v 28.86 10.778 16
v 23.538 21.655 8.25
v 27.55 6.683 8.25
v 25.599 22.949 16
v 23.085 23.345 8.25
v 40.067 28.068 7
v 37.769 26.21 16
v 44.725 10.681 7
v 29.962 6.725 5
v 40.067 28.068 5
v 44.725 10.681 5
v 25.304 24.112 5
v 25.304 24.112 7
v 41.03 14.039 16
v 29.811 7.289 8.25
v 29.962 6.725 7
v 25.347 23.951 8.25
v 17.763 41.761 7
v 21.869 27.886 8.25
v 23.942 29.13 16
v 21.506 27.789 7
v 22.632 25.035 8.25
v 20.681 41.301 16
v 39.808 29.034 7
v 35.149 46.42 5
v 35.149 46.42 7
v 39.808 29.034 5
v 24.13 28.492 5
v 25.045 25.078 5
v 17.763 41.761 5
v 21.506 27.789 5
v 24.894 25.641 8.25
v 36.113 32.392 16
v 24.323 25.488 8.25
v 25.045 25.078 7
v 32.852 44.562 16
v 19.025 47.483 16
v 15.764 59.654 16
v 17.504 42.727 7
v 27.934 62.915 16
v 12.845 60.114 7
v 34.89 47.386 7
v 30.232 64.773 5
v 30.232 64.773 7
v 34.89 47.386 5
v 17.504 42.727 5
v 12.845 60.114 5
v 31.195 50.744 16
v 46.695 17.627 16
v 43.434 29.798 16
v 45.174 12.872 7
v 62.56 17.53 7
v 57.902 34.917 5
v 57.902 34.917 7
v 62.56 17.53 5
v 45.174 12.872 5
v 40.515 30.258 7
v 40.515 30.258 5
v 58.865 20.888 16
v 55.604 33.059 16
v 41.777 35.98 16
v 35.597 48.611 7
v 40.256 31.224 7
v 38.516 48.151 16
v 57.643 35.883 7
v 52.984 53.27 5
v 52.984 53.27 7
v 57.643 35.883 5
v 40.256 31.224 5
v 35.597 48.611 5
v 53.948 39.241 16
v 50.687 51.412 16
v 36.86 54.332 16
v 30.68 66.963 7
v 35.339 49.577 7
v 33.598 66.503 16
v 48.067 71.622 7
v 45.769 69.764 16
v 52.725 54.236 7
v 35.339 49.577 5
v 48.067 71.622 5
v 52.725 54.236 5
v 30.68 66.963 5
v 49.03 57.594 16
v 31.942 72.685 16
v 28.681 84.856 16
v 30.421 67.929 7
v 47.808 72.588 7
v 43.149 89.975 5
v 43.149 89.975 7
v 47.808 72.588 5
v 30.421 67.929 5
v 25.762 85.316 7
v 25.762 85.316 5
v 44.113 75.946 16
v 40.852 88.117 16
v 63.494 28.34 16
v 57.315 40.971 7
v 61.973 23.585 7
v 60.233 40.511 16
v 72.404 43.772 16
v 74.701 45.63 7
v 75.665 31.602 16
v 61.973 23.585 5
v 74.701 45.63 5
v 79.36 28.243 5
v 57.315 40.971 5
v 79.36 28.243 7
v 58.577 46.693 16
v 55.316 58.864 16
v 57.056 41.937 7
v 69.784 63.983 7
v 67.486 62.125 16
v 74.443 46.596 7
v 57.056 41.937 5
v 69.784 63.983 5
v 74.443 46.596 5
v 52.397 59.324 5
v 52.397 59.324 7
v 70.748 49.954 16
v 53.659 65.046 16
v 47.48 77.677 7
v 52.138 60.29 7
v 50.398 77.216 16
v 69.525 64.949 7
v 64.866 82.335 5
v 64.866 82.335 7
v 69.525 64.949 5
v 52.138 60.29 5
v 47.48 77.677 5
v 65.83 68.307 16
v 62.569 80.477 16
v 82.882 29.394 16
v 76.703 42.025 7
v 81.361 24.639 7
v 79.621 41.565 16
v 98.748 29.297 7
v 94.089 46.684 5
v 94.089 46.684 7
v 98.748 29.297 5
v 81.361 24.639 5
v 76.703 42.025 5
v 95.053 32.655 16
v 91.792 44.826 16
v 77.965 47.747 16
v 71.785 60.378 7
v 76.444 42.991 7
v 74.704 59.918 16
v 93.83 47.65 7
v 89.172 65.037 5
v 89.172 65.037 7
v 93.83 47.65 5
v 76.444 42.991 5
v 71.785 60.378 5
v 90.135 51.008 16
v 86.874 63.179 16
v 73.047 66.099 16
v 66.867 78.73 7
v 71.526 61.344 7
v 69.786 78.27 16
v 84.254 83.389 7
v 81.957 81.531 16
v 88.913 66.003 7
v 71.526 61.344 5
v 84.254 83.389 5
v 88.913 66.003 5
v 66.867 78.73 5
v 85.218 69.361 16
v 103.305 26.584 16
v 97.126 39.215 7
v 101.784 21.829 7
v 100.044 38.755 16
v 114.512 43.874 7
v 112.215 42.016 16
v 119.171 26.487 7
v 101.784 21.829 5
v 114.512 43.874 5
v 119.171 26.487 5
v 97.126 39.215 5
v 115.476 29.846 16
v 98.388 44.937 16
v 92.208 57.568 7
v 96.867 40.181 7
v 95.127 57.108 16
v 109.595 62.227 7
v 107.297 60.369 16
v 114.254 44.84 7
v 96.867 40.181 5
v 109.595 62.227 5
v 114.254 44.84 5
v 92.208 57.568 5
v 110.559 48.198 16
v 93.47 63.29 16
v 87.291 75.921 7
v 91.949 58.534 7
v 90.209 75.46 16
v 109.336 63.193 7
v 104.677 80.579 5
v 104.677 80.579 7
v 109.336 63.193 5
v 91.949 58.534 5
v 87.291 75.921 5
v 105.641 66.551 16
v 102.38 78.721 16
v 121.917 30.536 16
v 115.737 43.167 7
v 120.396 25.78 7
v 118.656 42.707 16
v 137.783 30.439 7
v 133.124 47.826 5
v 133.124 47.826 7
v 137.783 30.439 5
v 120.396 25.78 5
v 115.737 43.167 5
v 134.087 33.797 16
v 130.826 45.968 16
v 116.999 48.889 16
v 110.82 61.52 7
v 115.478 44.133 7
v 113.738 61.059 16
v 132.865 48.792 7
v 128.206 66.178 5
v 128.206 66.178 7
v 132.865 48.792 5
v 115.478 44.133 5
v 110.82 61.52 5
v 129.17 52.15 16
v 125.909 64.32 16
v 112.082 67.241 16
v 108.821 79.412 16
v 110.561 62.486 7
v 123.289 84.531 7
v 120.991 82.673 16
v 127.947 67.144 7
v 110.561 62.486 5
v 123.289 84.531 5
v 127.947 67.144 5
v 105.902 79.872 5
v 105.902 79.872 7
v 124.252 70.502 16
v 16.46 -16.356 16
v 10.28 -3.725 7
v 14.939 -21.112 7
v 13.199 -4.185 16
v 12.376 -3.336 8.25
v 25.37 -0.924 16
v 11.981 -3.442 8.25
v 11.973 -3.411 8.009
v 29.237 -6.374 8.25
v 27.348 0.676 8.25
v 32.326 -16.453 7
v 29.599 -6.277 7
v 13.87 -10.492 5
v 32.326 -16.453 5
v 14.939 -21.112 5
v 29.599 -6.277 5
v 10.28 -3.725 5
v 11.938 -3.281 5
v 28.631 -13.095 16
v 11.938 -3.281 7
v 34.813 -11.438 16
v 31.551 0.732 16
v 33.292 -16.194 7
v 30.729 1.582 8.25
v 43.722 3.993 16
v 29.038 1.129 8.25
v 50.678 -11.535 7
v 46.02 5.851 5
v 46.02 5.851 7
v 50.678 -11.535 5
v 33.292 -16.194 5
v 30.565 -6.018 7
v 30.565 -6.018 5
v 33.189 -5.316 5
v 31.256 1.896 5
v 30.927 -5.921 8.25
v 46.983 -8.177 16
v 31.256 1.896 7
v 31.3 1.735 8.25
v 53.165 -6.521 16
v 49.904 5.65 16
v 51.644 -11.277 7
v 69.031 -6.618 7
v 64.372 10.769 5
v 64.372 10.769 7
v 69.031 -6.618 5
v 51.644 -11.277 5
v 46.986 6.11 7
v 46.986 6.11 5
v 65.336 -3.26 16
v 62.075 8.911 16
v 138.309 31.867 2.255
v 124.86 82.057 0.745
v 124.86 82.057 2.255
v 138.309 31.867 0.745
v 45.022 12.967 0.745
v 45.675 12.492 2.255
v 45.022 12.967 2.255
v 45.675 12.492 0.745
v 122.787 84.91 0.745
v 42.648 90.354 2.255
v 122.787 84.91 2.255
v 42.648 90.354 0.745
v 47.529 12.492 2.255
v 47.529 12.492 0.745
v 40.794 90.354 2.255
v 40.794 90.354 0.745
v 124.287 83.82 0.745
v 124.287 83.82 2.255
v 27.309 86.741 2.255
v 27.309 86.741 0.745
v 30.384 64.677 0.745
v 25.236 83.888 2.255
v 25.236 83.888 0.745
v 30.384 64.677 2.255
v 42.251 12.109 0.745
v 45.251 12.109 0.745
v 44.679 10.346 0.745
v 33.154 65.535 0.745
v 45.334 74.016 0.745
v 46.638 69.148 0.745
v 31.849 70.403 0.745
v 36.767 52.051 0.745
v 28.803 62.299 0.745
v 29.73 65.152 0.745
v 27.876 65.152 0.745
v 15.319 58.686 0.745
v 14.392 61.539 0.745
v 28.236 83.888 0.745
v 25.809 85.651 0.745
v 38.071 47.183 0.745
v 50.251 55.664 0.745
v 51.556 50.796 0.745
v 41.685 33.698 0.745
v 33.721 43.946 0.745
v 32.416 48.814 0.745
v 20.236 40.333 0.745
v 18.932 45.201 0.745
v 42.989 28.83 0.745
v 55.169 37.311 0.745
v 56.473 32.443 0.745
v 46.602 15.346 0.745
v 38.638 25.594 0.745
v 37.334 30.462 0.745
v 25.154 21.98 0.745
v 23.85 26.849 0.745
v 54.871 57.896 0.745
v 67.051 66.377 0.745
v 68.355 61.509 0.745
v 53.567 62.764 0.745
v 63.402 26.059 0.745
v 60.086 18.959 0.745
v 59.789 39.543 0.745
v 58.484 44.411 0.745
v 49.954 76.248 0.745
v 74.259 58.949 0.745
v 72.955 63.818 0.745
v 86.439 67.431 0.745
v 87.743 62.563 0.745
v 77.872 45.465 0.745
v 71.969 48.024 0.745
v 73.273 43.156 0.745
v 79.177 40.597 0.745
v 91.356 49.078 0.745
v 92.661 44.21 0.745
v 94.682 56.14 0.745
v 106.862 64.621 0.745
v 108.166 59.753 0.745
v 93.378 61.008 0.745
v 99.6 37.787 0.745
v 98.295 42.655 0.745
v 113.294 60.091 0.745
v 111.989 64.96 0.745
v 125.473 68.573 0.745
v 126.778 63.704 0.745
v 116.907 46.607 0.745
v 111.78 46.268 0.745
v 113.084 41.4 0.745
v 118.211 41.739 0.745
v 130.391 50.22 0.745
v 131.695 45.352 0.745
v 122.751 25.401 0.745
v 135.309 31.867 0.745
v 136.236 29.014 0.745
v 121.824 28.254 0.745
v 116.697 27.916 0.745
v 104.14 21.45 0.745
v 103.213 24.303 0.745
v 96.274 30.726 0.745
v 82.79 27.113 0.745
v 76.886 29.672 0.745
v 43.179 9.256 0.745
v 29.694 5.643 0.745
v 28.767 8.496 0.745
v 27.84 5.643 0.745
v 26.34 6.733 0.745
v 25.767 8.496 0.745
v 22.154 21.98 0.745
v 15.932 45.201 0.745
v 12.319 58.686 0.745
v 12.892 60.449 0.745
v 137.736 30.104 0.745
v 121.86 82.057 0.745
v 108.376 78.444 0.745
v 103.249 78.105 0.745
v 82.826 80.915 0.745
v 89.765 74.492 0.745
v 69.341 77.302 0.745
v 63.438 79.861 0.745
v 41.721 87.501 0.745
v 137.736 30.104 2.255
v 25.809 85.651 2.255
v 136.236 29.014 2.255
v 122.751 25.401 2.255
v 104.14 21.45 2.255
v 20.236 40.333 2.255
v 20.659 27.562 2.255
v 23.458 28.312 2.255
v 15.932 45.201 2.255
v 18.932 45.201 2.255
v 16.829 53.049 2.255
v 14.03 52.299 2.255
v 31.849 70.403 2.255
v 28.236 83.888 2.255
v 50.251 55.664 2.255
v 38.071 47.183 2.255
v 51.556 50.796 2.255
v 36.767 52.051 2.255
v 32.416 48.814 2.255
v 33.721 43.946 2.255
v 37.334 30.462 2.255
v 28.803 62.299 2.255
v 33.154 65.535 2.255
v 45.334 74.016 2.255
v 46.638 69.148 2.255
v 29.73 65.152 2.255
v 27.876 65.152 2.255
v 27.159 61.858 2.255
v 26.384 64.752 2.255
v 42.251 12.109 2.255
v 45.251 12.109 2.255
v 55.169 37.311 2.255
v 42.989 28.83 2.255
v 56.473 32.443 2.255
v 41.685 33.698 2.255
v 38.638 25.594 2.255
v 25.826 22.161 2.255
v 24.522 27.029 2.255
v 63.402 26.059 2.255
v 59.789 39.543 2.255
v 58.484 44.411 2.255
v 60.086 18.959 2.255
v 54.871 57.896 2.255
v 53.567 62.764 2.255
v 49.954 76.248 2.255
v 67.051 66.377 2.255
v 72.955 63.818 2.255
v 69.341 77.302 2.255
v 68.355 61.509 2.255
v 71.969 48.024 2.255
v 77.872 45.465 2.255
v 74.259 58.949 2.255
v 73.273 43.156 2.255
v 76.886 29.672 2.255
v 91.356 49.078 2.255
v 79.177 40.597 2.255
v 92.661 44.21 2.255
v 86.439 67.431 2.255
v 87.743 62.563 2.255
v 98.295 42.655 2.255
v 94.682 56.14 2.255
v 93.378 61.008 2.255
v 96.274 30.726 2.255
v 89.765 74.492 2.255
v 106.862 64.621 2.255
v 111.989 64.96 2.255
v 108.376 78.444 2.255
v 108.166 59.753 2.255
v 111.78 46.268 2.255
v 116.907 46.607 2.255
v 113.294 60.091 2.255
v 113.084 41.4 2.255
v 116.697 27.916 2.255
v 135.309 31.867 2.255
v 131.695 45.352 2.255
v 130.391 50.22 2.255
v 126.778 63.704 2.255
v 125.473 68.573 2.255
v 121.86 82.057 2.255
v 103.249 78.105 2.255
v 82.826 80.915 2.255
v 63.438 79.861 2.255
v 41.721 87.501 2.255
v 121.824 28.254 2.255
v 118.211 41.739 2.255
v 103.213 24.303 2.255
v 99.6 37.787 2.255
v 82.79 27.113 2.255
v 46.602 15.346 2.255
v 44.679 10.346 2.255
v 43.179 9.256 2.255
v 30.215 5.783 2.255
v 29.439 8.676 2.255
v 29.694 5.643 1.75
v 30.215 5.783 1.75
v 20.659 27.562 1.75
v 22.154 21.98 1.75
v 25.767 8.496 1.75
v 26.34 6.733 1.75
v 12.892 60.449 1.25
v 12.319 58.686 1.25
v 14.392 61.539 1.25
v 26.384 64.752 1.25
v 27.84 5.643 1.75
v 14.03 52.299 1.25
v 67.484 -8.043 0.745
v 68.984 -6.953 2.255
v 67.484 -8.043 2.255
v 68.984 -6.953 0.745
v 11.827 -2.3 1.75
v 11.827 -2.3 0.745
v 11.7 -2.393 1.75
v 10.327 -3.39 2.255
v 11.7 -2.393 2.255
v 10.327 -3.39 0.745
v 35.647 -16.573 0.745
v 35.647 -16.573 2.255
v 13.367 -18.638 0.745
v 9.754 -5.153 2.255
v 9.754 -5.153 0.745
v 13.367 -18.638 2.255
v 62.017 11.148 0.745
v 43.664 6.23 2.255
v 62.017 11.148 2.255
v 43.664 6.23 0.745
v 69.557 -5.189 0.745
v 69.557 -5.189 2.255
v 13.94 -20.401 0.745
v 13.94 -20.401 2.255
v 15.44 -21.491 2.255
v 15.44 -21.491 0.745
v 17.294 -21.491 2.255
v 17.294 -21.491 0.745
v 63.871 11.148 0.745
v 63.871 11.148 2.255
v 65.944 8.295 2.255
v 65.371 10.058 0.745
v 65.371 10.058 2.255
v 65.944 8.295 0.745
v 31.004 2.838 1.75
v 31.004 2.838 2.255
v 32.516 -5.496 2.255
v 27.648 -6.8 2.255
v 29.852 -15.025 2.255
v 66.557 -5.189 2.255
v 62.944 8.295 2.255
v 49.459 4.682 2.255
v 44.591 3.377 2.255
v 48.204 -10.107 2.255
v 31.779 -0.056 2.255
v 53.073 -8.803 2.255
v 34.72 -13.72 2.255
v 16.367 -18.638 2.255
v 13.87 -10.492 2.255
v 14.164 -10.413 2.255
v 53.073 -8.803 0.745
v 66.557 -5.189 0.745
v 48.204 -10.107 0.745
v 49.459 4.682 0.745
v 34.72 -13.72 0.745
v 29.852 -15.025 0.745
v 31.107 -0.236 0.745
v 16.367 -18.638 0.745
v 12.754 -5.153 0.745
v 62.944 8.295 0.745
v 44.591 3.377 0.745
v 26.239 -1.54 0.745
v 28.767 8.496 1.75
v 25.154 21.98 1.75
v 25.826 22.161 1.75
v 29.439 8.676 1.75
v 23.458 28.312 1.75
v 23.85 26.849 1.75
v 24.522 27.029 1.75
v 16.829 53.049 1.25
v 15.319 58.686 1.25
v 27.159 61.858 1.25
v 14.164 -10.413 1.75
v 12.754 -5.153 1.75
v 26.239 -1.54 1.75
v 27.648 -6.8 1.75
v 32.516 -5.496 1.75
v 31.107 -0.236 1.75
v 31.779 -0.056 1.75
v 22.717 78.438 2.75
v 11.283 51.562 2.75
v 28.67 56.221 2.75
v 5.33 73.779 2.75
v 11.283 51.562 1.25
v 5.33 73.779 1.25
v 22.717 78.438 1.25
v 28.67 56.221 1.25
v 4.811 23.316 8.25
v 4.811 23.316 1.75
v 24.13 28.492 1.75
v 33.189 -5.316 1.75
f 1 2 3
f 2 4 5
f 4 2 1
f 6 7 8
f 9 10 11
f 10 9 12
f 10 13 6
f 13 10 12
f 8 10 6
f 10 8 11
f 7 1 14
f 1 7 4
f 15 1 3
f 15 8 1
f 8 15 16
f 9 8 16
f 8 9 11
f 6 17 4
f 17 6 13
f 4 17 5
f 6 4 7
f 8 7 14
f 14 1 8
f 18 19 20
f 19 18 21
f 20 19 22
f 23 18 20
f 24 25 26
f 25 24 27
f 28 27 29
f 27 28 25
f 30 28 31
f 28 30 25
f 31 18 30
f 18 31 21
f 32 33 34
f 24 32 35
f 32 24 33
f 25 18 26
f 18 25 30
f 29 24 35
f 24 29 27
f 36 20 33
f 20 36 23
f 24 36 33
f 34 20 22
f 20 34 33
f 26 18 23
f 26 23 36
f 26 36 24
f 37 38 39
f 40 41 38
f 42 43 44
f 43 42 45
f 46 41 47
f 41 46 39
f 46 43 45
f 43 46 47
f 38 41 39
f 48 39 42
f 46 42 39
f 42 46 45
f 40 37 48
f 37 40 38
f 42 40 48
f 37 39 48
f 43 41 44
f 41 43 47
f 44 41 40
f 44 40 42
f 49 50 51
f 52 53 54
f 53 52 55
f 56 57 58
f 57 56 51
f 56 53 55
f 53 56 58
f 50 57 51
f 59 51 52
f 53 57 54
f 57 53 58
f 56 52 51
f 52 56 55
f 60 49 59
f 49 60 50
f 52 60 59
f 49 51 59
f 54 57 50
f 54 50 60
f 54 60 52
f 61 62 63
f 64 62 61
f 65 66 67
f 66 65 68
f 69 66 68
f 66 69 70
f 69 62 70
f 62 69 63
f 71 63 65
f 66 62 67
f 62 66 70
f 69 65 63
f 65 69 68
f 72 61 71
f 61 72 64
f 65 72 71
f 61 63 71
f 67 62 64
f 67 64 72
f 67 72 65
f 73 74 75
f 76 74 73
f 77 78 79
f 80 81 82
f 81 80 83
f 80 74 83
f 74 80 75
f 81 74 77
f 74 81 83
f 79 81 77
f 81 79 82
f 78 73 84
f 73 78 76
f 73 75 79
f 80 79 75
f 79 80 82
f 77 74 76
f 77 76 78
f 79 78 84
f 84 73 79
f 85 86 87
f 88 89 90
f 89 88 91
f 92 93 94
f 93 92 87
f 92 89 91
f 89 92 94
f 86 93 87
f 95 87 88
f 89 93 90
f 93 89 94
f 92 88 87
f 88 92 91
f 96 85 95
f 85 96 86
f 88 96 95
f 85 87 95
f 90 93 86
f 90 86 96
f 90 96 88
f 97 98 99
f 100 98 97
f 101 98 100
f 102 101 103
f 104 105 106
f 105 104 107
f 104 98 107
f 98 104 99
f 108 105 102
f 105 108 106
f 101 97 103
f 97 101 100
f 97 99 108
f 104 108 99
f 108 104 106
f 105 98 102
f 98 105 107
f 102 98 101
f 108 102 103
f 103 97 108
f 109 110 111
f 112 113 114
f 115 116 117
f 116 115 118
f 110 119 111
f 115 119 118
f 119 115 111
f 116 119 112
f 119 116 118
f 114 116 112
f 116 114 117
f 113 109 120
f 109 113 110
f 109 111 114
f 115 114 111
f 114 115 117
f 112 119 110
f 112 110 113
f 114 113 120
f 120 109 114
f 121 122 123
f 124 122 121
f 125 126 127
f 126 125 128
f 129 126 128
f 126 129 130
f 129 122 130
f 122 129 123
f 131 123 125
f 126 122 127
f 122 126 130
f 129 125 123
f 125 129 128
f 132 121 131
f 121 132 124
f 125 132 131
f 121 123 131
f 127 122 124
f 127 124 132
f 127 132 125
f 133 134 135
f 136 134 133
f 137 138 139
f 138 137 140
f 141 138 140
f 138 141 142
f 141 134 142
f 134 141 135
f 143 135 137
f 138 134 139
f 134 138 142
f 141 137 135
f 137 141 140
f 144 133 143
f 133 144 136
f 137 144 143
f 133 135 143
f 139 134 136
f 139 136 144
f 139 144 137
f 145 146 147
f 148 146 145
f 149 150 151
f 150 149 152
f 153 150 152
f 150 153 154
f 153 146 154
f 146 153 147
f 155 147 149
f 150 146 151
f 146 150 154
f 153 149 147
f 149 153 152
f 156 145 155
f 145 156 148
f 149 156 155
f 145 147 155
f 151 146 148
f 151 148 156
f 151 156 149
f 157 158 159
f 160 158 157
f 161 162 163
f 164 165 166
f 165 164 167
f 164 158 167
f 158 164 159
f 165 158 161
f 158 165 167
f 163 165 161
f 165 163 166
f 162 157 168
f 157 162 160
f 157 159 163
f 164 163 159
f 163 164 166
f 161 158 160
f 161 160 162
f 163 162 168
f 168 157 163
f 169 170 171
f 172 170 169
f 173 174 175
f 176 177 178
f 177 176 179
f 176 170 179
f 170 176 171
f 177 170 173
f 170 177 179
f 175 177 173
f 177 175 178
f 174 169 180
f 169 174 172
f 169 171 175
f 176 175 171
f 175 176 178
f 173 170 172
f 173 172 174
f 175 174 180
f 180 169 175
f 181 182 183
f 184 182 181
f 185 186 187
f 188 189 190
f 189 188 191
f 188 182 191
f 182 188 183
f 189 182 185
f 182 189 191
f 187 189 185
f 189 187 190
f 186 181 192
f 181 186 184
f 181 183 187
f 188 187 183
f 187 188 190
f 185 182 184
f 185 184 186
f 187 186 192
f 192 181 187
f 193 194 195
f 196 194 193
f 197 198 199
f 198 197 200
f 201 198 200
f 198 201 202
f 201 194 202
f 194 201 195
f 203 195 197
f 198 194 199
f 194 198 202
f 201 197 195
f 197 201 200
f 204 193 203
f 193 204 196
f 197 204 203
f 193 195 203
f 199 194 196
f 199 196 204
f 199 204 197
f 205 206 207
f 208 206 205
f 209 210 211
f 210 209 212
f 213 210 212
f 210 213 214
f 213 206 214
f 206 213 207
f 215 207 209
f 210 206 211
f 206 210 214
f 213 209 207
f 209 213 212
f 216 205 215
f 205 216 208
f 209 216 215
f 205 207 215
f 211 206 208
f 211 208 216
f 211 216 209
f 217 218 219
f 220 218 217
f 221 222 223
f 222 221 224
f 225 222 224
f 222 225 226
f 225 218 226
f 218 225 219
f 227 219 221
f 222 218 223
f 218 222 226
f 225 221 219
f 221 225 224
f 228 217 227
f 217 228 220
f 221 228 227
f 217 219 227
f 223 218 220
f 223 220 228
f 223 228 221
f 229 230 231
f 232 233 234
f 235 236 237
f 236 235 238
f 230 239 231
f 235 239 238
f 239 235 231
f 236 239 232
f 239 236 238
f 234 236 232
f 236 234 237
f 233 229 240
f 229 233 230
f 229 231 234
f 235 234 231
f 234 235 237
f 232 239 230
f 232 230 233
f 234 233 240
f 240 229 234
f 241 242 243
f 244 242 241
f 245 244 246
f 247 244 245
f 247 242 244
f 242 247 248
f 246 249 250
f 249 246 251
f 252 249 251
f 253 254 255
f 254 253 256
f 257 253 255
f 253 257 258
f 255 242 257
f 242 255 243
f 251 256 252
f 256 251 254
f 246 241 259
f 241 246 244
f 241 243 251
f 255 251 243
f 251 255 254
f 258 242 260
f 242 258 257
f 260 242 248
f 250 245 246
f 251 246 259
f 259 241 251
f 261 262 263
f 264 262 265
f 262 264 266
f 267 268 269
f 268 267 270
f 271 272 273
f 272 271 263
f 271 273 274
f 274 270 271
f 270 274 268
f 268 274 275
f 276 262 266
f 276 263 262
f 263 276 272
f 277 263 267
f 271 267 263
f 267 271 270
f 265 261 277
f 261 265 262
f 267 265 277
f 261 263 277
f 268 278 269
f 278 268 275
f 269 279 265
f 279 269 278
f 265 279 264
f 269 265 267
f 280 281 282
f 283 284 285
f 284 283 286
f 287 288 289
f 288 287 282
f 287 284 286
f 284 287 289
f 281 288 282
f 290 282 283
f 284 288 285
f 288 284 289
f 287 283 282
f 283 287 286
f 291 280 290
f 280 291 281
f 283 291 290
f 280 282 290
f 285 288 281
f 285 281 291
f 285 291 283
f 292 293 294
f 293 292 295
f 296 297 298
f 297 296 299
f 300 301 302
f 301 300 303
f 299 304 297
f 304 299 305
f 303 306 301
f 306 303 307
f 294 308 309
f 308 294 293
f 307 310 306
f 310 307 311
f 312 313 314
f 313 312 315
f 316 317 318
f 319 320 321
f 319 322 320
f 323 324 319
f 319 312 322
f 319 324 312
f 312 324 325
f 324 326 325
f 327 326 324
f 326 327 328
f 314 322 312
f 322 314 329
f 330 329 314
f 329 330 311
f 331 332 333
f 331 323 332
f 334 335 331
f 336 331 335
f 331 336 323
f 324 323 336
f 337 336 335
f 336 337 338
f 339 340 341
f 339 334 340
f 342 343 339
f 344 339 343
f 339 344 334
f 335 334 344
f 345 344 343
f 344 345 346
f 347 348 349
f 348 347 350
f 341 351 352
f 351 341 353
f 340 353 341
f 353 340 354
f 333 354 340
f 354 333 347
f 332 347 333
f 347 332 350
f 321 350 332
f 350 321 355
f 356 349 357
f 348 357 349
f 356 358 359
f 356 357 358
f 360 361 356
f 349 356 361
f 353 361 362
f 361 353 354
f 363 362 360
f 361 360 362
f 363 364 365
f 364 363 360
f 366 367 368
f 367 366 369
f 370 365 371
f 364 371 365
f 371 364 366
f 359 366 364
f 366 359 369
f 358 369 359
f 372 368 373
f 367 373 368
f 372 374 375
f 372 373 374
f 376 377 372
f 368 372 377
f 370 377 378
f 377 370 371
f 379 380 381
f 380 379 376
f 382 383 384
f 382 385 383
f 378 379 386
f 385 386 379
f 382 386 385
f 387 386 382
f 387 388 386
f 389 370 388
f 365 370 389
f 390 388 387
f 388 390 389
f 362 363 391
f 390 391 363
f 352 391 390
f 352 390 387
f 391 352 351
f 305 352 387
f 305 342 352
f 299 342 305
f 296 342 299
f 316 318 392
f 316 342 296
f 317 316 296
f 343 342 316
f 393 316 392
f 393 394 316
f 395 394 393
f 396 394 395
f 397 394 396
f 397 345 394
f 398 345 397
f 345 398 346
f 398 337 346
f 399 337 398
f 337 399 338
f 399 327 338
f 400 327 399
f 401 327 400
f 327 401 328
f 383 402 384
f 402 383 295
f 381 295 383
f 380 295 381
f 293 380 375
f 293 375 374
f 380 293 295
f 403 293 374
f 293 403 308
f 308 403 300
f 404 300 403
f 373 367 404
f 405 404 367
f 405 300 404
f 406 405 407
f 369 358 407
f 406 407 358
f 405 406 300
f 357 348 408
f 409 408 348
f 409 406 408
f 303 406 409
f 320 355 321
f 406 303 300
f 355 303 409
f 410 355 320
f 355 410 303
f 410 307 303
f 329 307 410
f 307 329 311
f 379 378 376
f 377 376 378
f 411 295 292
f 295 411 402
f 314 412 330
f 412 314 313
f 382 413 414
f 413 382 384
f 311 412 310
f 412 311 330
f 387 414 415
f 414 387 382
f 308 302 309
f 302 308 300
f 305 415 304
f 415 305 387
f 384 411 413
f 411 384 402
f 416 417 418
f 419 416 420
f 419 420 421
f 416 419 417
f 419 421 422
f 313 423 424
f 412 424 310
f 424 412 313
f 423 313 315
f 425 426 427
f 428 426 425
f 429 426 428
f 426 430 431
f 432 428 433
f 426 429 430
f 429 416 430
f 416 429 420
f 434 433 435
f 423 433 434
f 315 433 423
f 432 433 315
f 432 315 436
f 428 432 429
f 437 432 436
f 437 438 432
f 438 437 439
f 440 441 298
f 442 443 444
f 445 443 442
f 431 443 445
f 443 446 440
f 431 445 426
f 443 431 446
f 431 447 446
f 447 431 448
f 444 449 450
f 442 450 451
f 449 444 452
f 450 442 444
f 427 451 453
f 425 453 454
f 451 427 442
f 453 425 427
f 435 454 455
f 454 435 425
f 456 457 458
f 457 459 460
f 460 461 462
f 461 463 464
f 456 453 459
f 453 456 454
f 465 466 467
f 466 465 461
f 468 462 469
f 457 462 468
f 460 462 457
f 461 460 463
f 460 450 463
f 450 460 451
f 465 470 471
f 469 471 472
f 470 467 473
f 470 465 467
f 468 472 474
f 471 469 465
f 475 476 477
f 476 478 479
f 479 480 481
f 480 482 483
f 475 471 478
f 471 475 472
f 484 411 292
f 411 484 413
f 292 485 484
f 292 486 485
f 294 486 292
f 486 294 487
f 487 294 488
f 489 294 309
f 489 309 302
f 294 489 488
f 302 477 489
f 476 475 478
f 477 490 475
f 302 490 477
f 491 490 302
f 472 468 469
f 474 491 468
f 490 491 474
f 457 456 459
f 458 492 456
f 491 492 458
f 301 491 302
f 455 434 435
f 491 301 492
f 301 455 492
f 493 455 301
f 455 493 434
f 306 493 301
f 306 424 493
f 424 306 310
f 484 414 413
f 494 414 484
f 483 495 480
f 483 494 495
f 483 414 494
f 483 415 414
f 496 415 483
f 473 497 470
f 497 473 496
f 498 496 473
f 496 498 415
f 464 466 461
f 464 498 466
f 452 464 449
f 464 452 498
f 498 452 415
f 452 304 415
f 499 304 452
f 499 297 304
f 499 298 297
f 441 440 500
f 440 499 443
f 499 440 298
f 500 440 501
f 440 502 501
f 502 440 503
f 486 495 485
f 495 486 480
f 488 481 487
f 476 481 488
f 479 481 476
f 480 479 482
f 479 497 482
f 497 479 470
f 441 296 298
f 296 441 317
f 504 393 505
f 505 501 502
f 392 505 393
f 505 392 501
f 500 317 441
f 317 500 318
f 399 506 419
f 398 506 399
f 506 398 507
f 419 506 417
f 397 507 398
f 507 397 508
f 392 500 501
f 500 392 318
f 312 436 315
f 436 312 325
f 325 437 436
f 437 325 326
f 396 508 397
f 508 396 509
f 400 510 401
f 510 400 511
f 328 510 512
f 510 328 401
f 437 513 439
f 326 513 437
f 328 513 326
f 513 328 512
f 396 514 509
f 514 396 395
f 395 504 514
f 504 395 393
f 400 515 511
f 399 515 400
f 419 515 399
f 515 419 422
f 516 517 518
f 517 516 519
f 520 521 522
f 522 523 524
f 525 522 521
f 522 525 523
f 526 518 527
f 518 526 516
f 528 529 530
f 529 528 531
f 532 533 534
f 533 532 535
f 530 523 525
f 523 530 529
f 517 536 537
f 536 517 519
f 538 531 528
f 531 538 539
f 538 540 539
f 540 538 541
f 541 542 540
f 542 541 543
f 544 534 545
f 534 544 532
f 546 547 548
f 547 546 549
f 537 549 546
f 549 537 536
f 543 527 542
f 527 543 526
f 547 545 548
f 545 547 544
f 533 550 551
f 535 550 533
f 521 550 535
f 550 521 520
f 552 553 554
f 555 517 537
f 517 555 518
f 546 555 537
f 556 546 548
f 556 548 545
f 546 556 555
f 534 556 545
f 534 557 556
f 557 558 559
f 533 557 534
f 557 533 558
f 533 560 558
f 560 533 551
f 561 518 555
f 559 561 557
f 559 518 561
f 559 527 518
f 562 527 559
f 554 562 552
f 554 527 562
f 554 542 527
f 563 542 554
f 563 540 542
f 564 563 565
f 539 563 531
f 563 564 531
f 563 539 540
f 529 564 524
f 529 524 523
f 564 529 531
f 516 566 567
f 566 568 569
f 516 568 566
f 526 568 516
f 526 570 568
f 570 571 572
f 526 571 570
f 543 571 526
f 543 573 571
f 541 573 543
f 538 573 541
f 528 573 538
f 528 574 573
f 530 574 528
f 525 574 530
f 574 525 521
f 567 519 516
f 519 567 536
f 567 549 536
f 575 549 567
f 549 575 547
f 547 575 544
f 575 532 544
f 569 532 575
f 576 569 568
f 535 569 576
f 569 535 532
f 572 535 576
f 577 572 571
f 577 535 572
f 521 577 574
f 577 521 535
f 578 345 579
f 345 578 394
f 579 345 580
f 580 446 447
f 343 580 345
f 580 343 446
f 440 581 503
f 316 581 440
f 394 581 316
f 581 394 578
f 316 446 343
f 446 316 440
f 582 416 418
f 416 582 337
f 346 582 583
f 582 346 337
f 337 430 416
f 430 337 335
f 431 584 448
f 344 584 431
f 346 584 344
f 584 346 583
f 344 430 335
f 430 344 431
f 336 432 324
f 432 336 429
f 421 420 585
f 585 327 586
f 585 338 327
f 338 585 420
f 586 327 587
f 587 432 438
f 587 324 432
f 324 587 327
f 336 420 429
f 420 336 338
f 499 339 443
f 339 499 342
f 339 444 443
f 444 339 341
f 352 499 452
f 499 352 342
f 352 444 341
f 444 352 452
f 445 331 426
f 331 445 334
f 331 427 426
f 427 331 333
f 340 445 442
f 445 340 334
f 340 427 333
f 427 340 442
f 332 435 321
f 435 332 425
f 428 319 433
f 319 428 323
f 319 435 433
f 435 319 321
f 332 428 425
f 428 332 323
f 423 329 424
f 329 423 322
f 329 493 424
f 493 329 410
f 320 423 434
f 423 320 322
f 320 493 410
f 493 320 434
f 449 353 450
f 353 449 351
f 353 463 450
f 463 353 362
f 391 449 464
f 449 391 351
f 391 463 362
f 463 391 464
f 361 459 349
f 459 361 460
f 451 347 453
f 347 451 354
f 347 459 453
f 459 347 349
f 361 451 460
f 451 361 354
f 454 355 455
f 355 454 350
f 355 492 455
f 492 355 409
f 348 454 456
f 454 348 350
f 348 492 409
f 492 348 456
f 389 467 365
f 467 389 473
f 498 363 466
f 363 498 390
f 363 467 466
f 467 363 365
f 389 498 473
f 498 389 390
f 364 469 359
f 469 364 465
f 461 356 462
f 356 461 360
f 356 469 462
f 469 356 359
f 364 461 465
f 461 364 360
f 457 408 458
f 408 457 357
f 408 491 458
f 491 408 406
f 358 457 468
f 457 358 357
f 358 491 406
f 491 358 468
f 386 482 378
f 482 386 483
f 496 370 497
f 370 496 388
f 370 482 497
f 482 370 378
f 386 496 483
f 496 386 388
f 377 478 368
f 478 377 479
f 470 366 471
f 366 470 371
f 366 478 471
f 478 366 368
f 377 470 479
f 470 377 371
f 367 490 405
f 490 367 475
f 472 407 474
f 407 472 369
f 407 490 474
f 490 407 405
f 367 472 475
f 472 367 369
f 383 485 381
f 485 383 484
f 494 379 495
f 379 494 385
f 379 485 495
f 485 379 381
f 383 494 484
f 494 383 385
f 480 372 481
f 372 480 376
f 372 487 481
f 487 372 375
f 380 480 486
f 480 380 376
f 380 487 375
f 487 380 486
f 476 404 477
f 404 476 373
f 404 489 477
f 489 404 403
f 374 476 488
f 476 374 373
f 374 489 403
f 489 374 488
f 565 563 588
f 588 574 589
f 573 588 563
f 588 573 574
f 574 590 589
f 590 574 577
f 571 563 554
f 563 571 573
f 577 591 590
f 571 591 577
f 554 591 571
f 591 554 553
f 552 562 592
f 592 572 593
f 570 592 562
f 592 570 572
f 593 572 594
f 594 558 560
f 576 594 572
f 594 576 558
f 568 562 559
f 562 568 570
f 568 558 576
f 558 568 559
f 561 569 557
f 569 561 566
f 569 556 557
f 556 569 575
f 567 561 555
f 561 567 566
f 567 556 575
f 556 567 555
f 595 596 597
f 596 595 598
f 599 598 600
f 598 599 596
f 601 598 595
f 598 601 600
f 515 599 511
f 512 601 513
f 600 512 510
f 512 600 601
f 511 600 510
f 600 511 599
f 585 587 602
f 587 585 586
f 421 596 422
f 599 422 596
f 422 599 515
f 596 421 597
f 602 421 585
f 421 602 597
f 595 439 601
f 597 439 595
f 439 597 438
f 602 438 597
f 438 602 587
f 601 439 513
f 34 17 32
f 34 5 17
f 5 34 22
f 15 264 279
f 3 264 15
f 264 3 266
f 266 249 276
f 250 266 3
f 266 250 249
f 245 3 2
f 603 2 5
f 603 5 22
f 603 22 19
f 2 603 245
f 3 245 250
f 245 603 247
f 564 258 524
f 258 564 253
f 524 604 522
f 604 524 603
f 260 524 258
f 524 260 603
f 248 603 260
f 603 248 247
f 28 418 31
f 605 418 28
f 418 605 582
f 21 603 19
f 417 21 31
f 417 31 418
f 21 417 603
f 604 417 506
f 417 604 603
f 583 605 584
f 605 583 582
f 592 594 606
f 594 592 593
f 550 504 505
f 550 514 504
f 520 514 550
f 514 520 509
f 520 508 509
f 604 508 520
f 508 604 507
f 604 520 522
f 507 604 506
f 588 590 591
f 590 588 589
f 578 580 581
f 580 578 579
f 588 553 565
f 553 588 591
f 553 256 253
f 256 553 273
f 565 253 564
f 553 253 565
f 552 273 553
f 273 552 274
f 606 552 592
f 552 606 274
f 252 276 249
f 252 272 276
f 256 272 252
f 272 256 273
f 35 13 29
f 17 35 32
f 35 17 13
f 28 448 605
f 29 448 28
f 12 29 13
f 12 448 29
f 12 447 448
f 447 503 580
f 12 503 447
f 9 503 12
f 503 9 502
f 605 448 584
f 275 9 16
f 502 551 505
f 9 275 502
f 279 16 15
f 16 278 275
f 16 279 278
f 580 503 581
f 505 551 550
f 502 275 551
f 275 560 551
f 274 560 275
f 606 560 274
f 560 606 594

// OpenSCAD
union () {
  translate ([1, 0, 0]) {
    union () {
      translate ([0, 0, 2]) {
        color ([0.3, 0.3, 0.8, 1]) {
          translate ([16, 65, 0]) {
            rotate (a=14.999999999999998, v=[0, 0, 1]) {
              cube ([18, 23, 1.5], center=true);
            }
          }
        }
      }
      translate ([0, 0, 2]) {
        color ([0.3, 0.8, 0.3, 1]) {
          translate ([18, 9, 3]) {
            rotate (a=14.999999999999998, v=[0, 0, 1]) {
              cube ([20, 35, 6.5], center=true);
            }
          }
        }
      }
      translate ([0, 0, 1]) {
        rotate (a=14.999999999999998, v=[0, 0, 1]) {
          translate ([36.0, 8.0, 0]) {
            color ([0.3, 0.3, 0.3, 1]) {
              translate ([0, 0, 5]) {
                hull () {
                  cube ([18, 18, 2], center=true);
                  translate ([0, 1.5, 9]) {
                    cube ([12.6, 12.6, 2], center=true);
                  }
                }
              }
            }
          }
        }
        rotate (a=14.999999999999998, v=[0, 0, 1]) {
          translate ([36.0, 27.0, 0]) {
            color ([0.3, 0.3, 0.3, 1]) {
              translate ([0, 0, 5]) {
                hull () {
                  cube ([18, 18, 2], center=true);
                  translate ([0, 1.5, 9]) {
                    cube ([12.6, 12.6, 2], center=true);
                  }
                }
              }
            }
          }
        }
        rotate (a=14.999999999999998, v=[0, 0, 1]) {
          translate ([36.0, 46.0, 0]) {
            color ([0.3, 0.3, 0.3, 1]) {
              translate ([0, 0, 5]) {
                hull () {
                  cube ([18, 18, 2], center=true);
                  translate ([0, 1.5, 9]) {
                    cube ([12.6, 12.6, 2], center=true);
                  }
                }
              }
            }
          }
        }
        rotate (a=14.999999999999998, v=[0, 0, 1]) {
          translate ([55.0, 10.0, 0]) {
            color ([0.3, 0.3, 0.3, 1]) {
              translate ([0, 0, 5]) {
                hull () {
                  cube ([18, 18, 2], center=true);
                  translate ([0, 1.5, 9]) {
                    cube ([12.6, 12.6, 2], center=true);
                  }
                }
              }
            }
          }
        }
        rotate (a=14.999999999999998, v=[0, 0, 1]) {
          translate ([55.0, 29.0, 0]) {
            color ([0.3, 0.3, 0.3, 1]) {
              translate ([0, 0, 5]) {
                hull () {
                  cube ([18, 18, 2], center=true);
                  translate ([0, 1.5, 9]) {
                    cube ([12.6, 12.6, 2], center=true);
                  }
                }
              }
            }
          }
        }
        rotate (a=14.999999999999998, v=[0, 0, 1]) {
          translate ([55.0, 48.0, 0]) {
            color ([0.3, 0.3, 0.3, 1]) {
              translate ([0, 0, 5]) {
                hull () {
                  cube ([18, 18, 2], center=true);
                  translate ([0, 1.5, 9]) {
                    cube ([12.6, 12.6, 2], center=true);
                  }
                }
              }
            }
          }
        }
        rotate (a=14.999999999999998, v=[0, 0, 1]) {
          translate ([55.0, 67.0, 0]) {
            color ([0.3, 0.3, 0.3, 1]) {
              translate ([0, 0, 5]) {
                hull () {
                  cube ([18, 18, 2], center=true);
                  translate ([0, 1.5, 9]) {
                    cube ([12.6, 12.6, 2], center=true);
                  }
                }
              }
            }
          }
        }
        rotate (a=14.999999999999998, v=[0, 0, 1]) {
          translate ([74.0, 16.0, 0]) {
            color ([0.3, 0.3, 0.3, 1]) {
              translate ([0, 0, 5]) {
                hull () {
                  cube ([18, 18, 2], center=true);
                  translate ([0, 1.5, 9]) {
                    cube ([12.6, 12.6, 2], center=true);
                  }
                }
              }
            }
          }
        }
        rotate (a=14.999999999999998, v=[0, 0, 1]) {
          translate ([74.0, 35.0, 0]) {
            color ([0.3, 0.3, 0.3, 1]) {
              translate ([0, 0, 5]) {
                hull () {
                  cube ([18, 18, 2], center=true);
                  translate ([0, 1.5, 9]) {
                    cube ([12.6, 12.6, 2], center=true);
                  }
                }
              }
            }
          }
        }
        rotate (a=14.999999999999998, v=[0, 0, 1]) {
          translate ([74.0, 54.0, 0]) {
            color ([0.3, 0.3, 0.3, 1]) {
              translate ([0, 0, 5]) {
                hull () {
                  cube ([18, 18, 2], center=true);
                  translate ([0, 1.5, 9]) {
                    cube ([12.6, 12.6, 2], center=true);
                  }
                }
              }
            }
          }
        }
        rotate (a=14.999999999999998, v=[0, 0, 1]) {
          translate ([93.0, 12.0, 0]) {
            color ([0.3, 0.3, 0.3, 1]) {
              translate ([0, 0, 5]) {
                hull () {
                  cube ([18, 18, 2], center=true);
                  translate ([0, 1.5, 9]) {
                    cube ([12.6, 12.6, 2], center=true);
                  }
                }
              }
            }
          }
        }
        rotate (a=14.999999999999998, v=[0, 0, 1]) {
          translate ([93.0, 31.0, 0]) {
            color ([0.3, 0.3, 0.3, 1]) {
              translate ([0, 0, 5]) {
                hull () {
                  cube ([18, 18, 2], center=true);
                  translate ([0, 1.5, 9]) {
                    cube ([12.6, 12.6, 2], center=true);
                  }
                }
              }
            }
          }
        }
        rotate (a=14.999999999999998, v=[0, 0, 1]) {
          translate ([93.0, 50.0, 0]) {
            color ([0.3, 0.3, 0.3, 1]) {
              translate ([0, 0, 5]) {
                hull () {
                  cube ([18, 18, 2], center=true);
                  translate ([0, 1.5, 9]) {
                    cube ([12.6, 12.6, 2], center=true);
                  }
                }
              }
            }
          }
        }
        rotate (a=14.999999999999998, v=[0, 0, 1]) {
          translate ([112.0, 4.0, 0]) {
            color ([0.3, 0.3, 0.3, 1]) {
              translate ([0, 0, 5]) {
                hull () {
                  cube ([18, 18, 2], center=true);
                  translate ([0, 1.5, 9]) {
                    cube ([12.6, 12.6, 2], center=true);
                  }
                }
              }
            }
          }
        }
        rotate (a=14.999999999999998, v=[0, 0, 1]) {
          translate ([112.0, 23.0, 0]) {
            color ([0.3, 0.3, 0.3, 1]) {
              translate ([0, 0, 5]) {
                hull () {
                  cube ([18, 18, 2], center=true);
                  translate ([0, 1.5, 9]) {
                    cube ([12.6, 12.6, 2], center=true);
                  }
                }
              }
            }
          }
        }
        rotate (a=14.999999999999998, v=[0, 0, 1]) {
          translate ([112.0, 42.0, 0]) {
            color ([0.3, 0.3, 0.3, 1]) {
              translate ([0, 0, 5]) {
                hull () {
                  cube ([18, 18, 2], center=true);
                  translate ([0, 1.5, 9]) {
                    cube ([12.6, 12.6, 2], center=true);
                  }
                }
              }
            }
          }
        }
        rotate (a=14.999999999999998, v=[0, 0, 1]) {
          translate ([131.0, 3.0, 0]) {
            color ([0.3, 0.3, 0.3, 1]) {
              translate ([0, 0, 5]) {
                hull () {
                  cube ([18, 18, 2], center=true);
                  translate ([0, 1.5, 9]) {
                    cube ([12.6, 12.6, 2], center=true);
                  }
                }
              }
            }
          }
        }
        rotate (a=14.999999999999998, v=[0, 0, 1]) {
          translate ([131.0, 22.0, 0]) {
            color ([0.3, 0.3, 0.3, 1]) {
              translate ([0, 0, 5]) {
                hull () {
                  cube ([18, 18, 2], center=true);
                  translate ([0, 1.5, 9]) {
                    cube ([12.6, 12.6, 2], center=true);
                  }
                }
              }
            }
          }
        }
        rotate (a=14.999999999999998, v=[0, 0, 1]) {
          translate ([131.0, 41.0, 0]) {
            color ([0.3, 0.3, 0.3, 1]) {
              translate ([0, 0, 5]) {
                hull () {
                  cube ([18, 18, 2], center=true);
                  translate ([0, 1.5, 9]) {
                    cube ([12.6, 12.6, 2], center=true);
                  }
                }
              }
            }
          }
        }
        rotate (a=14.999999999999998, v=[0, 0, 1]) {
          translate ([17.0, -15.0, 0]) {
            color ([0.3, 0.3, 0.3, 1]) {
              translate ([0, 0, 5]) {
                hull () {
                  cube ([18, 18, 2], center=true);
                  translate ([0, 1.5, 9]) {
                    cube ([12.6, 12.6, 2], center=true);
                  }
                }
              }
            }
          }
        }
        rotate (a=14.999999999999998, v=[0, 0, 1]) {
          translate ([36.0, -15.0, 0]) {
            color ([0.3, 0.3, 0.3, 1]) {
              translate ([0, 0, 5]) {
                hull () {
                  cube ([18, 18, 2], center=true);
                  translate ([0, 1.5, 9]) {
                    cube ([12.6, 12.6, 2], center=true);
                  }
                }
              }
            }
          }
        }
        rotate (a=14.999999999999998, v=[0, 0, 1]) {
          translate ([55.0, -15.0, 0]) {
            color ([0.3, 0.3, 0.3, 1]) {
              translate ([0, 0, 5]) {
                hull () {
                  cube ([18, 18, 2], center=true);
                  translate ([0, 1.5, 9]) {
                    cube ([12.6, 12.6, 2], center=true);
                  }
                }
              }
            }
          }
        }
      }
      translate ([0, 0, 1.5]) {
        difference () {
          minkowski () {
            union () {
              hull () {
                rotate (a=14.999999999999998, v=[0, 0, 1]) {
                  translate ([36.0, 8.0, 0]) {
                    cube ([13.96, 13.96, 0.01], center=true);
                  }
                }
                rotate (a=14.999999999999998, v=[0, 0, 1]) {
                  translate ([36.0, 27.0, 0]) {
                    cube ([13.96, 13.96, 0.01], center=true);
                  }
                }
                rotate (a=14.999999999999998, v=[0, 0, 1]) {
                  translate ([36.0, 46.0, 0]) {
                    cube ([13.96, 13.96, 0.01], center=true);
                  }
                }
              }
              hull () {
                rotate (a=14.999999999999998, v=[0, 0, 1]) {
                  translate ([17.0, -15.0, 0]) {
                    cube ([13.96, 13.96, 0.01], center=true);
                  }
                }
                rotate (a=14.999999999999998, v=[0, 0, 1]) {
                  translate ([36.0, -15.0, 0]) {
                    cube ([13.96, 13.96, 0.01], center=true);
                  }
                }
                rotate (a=14.999999999999998, v=[0, 0, 1]) {
                  translate ([55.0, -15.0, 0]) {
                    cube ([13.96, 13.96, 0.01], center=true);
                  }
                }
              }
              hull () {
                rotate (a=14.999999999999998, v=[0, 0, 1]) {
                  translate ([55.0, 10.0, 0]) {
                    cube ([13.96, 13.96, 0.01], center=true);
                  }
                }
                rotate (a=14.999999999999998, v=[0, 0, 1]) {
                  translate ([55.0, 29.0, 0]) {
                    cube ([13.96, 13.96, 0.01], center=true);
                  }
                }
                rotate (a=14.999999999999998, v=[0, 0, 1]) {
                  translate ([55.0, 48.0, 0]) {
                    cube ([13.96, 13.96, 0.01], center=true);
                  }
                }
                rotate (a=14.999999999999998, v=[0, 0, 1]) {
                  translate ([55.0, 67.0, 0]) {
                    cube ([13.96, 13.96, 0.01], center=true);
                  }
                }
                rotate (a=14.999999999999998, v=[0, 0, 1]) {
                  translate ([74.0, 16.0, 0]) {
                    cube ([13.96, 13.96, 0.01], center=true);
                  }
                }
                rotate (a=14.999999999999998, v=[0, 0, 1]) {
                  translate ([74.0, 35.0, 0]) {
                    cube ([13.96, 13.96, 0.01], center=true);
                  }
                }
                rotate (a=14.999999999999998, v=[0, 0, 1]) {
                  translate ([74.0, 54.0, 0]) {
                    cube ([13.96, 13.96, 0.01], center=true);
                  }
                }
                rotate (a=14.999999999999998, v=[0, 0, 1]) {
                  translate ([93.0, 12.0, 0]) {
                    cube ([13.96, 13.96, 0.01], center=true);
                  }
                }
                rotate (a=14.999999999999998, v=[0, 0, 1]) {
                  translate ([93.0, 31.0, 0]) {
                    cube ([13.96, 13.96, 0.01], center=true);
                  }
                }
                rotate (a=14.999999999999998, v=[0, 0, 1]) {
                  translate ([93.0, 50.0, 0]) {
                    cube ([13.96, 13.96, 0.01], center=true);
                  }
                }
                rotate (a=14.999999999999998, v=[0, 0, 1]) {
                  translate ([112.0, 4.0, 0]) {
                    cube ([13.96, 13.96, 0.01], center=true);
                  }
                }
                rotate (a=14.999999999999998, v=[0, 0, 1]) {
                  translate ([112.0, 23.0, 0]) {
                    cube ([13.96, 13.96, 0.01], center=true);
                  }
                }
                rotate (a=14.999999999999998, v=[0, 0, 1]) {
                  translate ([112.0, 42.0, 0]) {
                    cube ([13.96, 13.96, 0.01], center=true);
                  }
                }
                rotate (a=14.999999999999998, v=[0, 0, 1]) {
                  translate ([131.0, 3.0, 0]) {
                    cube ([13.96, 13.96, 0.01], center=true);
                  }
                }
                rotate (a=14.999999999999998, v=[0, 0, 1]) {
                  translate ([131.0, 22.0, 0]) {
                    cube ([13.96, 13.96, 0.01], center=true);
                  }
                }
                rotate (a=14.999999999999998, v=[0, 0, 1]) {
                  translate ([131.0, 41.0, 0]) {
                    cube ([13.96, 13.96, 0.01], center=true);
                  }
                }
              }
            }
            cylinder (h=1.5, r=3, center=true);
          }
          rotate (a=14.999999999999998, v=[0, 0, 1]) {
            translate ([36.0, 8.0, 0]) {
              cube ([13.96, 13.96, 25], center=true);
            }
          }
          rotate (a=14.999999999999998, v=[0, 0, 1]) {
            translate ([36.0, 27.0, 0]) {
              cube ([13.96, 13.96, 25], center=true);
            }
          }
          rotate (a=14.999999999999998, v=[0, 0, 1]) {
            translate ([36.0, 46.0, 0]) {
              cube ([13.96, 13.96, 25], center=true);
            }
          }
          rotate (a=14.999999999999998, v=[0, 0, 1]) {
            translate ([55.0, 10.0, 0]) {
              cube ([13.96, 13.96, 25], center=true);
            }
          }
          rotate (a=14.999999999999998, v=[0, 0, 1]) {
            translate ([55.0, 29.0, 0]) {
              cube ([13.96, 13.96, 25], center=true);
            }
          }
          rotate (a=14.999999999999998, v=[0, 0, 1]) {
            translate ([55.0, 48.0, 0]) {
              cube ([13.96, 13.96, 25], center=true);
            }
          }
          rotate (a=14.999999999999998, v=[0, 0, 1]) {
            translate ([55.0, 67.0, 0]) {
              cube ([13.96, 13.96, 25], center=true);
            }
          }
          rotate (a=14.999999999999998, v=[0, 0, 1]) {
            translate ([74.0, 16.0, 0]) {
              cube ([13.96, 13.96, 25], center=true);
            }
          }
          rotate (a=14.999999999999998, v=[0, 0, 1]) {
            translate ([74.0, 35.0, 0]) {
              cube ([13.96, 13.96, 25], center=true);
            }
          }
          rotate (a=14.999999999999998, v=[0, 0, 1]) {
            translate ([74.0, 54.0, 0]) {
              cube ([13.96, 13.96, 25], center=true);
            }
          }
          rotate (a=14.999999999999998, v=[0, 0, 1]) {
            translate ([93.0, 12.0, 0]) {
              cube ([13.96, 13.96, 25], center=true);
            }
          }
          rotate (a=14.999999999999998, v=[0, 0, 1]) {
            translate ([93.0, 31.0, 0]) {
              cube ([13.96, 13.96, 25], center=true);
            }
          }
          rotate (a=14.999999999999998, v=[0, 0, 1]) {
            translate ([93.0, 50.0, 0]) {
              cube ([13.96, 13.96, 25], center=true);
            }
          }
          rotate (a=14.999999999999998, v=[0, 0, 1]) {
            translate ([112.0, 4.0, 0]) {
              cube ([13.96, 13.96, 25], center=true);
            }
          }
          rotate (a=14.999999999999998, v=[0, 0, 1]) {
            translate ([112.0, 23.0, 0]) {
              cube ([13.96, 13.96, 25], center=true);
            }
          }
          rotate (a=14.999999999999998, v=[0, 0, 1]) {
            translate ([112.0, 42.0, 0]) {
              cube ([13.96, 13.96, 25], center=true);
            }
          }
          rotate (a=14.999999999999998, v=[0, 0, 1]) {
            translate ([131.0, 3.0, 0]) {
              cube ([13.96, 13.96, 25], center=true);
            }
          }
          rotate (a=14.999999999999998, v=[0, 0, 1]) {
            translate ([131.0, 22.0, 0]) {
              cube ([13.96, 13.96, 25], center=true);
            }
          }
          rotate (a=14.999999999999998, v=[0, 0, 1]) {
            translate ([131.0, 41.0, 0]) {
              cube ([13.96, 13.96, 25], center=true);
            }
          }
          rotate (a=14.999999999999998, v=[0, 0, 1]) {
            translate ([17.0, -15.0, 0]) {
              cube ([13.96, 13.96, 25], center=true);
            }
          }
          rotate (a=14.999999999999998, v=[0, 0, 1]) {
            translate ([36.0, -15.0, 0]) {
              cube ([13.96, 13.96, 25], center=true);
            }
          }
          rotate (a=14.999999999999998, v=[0, 0, 1]) {
            translate ([55.0, -15.0, 0]) {
              cube ([13.96, 13.96, 25], center=true);
            }
          }
        }
      }
    }
  }
}
